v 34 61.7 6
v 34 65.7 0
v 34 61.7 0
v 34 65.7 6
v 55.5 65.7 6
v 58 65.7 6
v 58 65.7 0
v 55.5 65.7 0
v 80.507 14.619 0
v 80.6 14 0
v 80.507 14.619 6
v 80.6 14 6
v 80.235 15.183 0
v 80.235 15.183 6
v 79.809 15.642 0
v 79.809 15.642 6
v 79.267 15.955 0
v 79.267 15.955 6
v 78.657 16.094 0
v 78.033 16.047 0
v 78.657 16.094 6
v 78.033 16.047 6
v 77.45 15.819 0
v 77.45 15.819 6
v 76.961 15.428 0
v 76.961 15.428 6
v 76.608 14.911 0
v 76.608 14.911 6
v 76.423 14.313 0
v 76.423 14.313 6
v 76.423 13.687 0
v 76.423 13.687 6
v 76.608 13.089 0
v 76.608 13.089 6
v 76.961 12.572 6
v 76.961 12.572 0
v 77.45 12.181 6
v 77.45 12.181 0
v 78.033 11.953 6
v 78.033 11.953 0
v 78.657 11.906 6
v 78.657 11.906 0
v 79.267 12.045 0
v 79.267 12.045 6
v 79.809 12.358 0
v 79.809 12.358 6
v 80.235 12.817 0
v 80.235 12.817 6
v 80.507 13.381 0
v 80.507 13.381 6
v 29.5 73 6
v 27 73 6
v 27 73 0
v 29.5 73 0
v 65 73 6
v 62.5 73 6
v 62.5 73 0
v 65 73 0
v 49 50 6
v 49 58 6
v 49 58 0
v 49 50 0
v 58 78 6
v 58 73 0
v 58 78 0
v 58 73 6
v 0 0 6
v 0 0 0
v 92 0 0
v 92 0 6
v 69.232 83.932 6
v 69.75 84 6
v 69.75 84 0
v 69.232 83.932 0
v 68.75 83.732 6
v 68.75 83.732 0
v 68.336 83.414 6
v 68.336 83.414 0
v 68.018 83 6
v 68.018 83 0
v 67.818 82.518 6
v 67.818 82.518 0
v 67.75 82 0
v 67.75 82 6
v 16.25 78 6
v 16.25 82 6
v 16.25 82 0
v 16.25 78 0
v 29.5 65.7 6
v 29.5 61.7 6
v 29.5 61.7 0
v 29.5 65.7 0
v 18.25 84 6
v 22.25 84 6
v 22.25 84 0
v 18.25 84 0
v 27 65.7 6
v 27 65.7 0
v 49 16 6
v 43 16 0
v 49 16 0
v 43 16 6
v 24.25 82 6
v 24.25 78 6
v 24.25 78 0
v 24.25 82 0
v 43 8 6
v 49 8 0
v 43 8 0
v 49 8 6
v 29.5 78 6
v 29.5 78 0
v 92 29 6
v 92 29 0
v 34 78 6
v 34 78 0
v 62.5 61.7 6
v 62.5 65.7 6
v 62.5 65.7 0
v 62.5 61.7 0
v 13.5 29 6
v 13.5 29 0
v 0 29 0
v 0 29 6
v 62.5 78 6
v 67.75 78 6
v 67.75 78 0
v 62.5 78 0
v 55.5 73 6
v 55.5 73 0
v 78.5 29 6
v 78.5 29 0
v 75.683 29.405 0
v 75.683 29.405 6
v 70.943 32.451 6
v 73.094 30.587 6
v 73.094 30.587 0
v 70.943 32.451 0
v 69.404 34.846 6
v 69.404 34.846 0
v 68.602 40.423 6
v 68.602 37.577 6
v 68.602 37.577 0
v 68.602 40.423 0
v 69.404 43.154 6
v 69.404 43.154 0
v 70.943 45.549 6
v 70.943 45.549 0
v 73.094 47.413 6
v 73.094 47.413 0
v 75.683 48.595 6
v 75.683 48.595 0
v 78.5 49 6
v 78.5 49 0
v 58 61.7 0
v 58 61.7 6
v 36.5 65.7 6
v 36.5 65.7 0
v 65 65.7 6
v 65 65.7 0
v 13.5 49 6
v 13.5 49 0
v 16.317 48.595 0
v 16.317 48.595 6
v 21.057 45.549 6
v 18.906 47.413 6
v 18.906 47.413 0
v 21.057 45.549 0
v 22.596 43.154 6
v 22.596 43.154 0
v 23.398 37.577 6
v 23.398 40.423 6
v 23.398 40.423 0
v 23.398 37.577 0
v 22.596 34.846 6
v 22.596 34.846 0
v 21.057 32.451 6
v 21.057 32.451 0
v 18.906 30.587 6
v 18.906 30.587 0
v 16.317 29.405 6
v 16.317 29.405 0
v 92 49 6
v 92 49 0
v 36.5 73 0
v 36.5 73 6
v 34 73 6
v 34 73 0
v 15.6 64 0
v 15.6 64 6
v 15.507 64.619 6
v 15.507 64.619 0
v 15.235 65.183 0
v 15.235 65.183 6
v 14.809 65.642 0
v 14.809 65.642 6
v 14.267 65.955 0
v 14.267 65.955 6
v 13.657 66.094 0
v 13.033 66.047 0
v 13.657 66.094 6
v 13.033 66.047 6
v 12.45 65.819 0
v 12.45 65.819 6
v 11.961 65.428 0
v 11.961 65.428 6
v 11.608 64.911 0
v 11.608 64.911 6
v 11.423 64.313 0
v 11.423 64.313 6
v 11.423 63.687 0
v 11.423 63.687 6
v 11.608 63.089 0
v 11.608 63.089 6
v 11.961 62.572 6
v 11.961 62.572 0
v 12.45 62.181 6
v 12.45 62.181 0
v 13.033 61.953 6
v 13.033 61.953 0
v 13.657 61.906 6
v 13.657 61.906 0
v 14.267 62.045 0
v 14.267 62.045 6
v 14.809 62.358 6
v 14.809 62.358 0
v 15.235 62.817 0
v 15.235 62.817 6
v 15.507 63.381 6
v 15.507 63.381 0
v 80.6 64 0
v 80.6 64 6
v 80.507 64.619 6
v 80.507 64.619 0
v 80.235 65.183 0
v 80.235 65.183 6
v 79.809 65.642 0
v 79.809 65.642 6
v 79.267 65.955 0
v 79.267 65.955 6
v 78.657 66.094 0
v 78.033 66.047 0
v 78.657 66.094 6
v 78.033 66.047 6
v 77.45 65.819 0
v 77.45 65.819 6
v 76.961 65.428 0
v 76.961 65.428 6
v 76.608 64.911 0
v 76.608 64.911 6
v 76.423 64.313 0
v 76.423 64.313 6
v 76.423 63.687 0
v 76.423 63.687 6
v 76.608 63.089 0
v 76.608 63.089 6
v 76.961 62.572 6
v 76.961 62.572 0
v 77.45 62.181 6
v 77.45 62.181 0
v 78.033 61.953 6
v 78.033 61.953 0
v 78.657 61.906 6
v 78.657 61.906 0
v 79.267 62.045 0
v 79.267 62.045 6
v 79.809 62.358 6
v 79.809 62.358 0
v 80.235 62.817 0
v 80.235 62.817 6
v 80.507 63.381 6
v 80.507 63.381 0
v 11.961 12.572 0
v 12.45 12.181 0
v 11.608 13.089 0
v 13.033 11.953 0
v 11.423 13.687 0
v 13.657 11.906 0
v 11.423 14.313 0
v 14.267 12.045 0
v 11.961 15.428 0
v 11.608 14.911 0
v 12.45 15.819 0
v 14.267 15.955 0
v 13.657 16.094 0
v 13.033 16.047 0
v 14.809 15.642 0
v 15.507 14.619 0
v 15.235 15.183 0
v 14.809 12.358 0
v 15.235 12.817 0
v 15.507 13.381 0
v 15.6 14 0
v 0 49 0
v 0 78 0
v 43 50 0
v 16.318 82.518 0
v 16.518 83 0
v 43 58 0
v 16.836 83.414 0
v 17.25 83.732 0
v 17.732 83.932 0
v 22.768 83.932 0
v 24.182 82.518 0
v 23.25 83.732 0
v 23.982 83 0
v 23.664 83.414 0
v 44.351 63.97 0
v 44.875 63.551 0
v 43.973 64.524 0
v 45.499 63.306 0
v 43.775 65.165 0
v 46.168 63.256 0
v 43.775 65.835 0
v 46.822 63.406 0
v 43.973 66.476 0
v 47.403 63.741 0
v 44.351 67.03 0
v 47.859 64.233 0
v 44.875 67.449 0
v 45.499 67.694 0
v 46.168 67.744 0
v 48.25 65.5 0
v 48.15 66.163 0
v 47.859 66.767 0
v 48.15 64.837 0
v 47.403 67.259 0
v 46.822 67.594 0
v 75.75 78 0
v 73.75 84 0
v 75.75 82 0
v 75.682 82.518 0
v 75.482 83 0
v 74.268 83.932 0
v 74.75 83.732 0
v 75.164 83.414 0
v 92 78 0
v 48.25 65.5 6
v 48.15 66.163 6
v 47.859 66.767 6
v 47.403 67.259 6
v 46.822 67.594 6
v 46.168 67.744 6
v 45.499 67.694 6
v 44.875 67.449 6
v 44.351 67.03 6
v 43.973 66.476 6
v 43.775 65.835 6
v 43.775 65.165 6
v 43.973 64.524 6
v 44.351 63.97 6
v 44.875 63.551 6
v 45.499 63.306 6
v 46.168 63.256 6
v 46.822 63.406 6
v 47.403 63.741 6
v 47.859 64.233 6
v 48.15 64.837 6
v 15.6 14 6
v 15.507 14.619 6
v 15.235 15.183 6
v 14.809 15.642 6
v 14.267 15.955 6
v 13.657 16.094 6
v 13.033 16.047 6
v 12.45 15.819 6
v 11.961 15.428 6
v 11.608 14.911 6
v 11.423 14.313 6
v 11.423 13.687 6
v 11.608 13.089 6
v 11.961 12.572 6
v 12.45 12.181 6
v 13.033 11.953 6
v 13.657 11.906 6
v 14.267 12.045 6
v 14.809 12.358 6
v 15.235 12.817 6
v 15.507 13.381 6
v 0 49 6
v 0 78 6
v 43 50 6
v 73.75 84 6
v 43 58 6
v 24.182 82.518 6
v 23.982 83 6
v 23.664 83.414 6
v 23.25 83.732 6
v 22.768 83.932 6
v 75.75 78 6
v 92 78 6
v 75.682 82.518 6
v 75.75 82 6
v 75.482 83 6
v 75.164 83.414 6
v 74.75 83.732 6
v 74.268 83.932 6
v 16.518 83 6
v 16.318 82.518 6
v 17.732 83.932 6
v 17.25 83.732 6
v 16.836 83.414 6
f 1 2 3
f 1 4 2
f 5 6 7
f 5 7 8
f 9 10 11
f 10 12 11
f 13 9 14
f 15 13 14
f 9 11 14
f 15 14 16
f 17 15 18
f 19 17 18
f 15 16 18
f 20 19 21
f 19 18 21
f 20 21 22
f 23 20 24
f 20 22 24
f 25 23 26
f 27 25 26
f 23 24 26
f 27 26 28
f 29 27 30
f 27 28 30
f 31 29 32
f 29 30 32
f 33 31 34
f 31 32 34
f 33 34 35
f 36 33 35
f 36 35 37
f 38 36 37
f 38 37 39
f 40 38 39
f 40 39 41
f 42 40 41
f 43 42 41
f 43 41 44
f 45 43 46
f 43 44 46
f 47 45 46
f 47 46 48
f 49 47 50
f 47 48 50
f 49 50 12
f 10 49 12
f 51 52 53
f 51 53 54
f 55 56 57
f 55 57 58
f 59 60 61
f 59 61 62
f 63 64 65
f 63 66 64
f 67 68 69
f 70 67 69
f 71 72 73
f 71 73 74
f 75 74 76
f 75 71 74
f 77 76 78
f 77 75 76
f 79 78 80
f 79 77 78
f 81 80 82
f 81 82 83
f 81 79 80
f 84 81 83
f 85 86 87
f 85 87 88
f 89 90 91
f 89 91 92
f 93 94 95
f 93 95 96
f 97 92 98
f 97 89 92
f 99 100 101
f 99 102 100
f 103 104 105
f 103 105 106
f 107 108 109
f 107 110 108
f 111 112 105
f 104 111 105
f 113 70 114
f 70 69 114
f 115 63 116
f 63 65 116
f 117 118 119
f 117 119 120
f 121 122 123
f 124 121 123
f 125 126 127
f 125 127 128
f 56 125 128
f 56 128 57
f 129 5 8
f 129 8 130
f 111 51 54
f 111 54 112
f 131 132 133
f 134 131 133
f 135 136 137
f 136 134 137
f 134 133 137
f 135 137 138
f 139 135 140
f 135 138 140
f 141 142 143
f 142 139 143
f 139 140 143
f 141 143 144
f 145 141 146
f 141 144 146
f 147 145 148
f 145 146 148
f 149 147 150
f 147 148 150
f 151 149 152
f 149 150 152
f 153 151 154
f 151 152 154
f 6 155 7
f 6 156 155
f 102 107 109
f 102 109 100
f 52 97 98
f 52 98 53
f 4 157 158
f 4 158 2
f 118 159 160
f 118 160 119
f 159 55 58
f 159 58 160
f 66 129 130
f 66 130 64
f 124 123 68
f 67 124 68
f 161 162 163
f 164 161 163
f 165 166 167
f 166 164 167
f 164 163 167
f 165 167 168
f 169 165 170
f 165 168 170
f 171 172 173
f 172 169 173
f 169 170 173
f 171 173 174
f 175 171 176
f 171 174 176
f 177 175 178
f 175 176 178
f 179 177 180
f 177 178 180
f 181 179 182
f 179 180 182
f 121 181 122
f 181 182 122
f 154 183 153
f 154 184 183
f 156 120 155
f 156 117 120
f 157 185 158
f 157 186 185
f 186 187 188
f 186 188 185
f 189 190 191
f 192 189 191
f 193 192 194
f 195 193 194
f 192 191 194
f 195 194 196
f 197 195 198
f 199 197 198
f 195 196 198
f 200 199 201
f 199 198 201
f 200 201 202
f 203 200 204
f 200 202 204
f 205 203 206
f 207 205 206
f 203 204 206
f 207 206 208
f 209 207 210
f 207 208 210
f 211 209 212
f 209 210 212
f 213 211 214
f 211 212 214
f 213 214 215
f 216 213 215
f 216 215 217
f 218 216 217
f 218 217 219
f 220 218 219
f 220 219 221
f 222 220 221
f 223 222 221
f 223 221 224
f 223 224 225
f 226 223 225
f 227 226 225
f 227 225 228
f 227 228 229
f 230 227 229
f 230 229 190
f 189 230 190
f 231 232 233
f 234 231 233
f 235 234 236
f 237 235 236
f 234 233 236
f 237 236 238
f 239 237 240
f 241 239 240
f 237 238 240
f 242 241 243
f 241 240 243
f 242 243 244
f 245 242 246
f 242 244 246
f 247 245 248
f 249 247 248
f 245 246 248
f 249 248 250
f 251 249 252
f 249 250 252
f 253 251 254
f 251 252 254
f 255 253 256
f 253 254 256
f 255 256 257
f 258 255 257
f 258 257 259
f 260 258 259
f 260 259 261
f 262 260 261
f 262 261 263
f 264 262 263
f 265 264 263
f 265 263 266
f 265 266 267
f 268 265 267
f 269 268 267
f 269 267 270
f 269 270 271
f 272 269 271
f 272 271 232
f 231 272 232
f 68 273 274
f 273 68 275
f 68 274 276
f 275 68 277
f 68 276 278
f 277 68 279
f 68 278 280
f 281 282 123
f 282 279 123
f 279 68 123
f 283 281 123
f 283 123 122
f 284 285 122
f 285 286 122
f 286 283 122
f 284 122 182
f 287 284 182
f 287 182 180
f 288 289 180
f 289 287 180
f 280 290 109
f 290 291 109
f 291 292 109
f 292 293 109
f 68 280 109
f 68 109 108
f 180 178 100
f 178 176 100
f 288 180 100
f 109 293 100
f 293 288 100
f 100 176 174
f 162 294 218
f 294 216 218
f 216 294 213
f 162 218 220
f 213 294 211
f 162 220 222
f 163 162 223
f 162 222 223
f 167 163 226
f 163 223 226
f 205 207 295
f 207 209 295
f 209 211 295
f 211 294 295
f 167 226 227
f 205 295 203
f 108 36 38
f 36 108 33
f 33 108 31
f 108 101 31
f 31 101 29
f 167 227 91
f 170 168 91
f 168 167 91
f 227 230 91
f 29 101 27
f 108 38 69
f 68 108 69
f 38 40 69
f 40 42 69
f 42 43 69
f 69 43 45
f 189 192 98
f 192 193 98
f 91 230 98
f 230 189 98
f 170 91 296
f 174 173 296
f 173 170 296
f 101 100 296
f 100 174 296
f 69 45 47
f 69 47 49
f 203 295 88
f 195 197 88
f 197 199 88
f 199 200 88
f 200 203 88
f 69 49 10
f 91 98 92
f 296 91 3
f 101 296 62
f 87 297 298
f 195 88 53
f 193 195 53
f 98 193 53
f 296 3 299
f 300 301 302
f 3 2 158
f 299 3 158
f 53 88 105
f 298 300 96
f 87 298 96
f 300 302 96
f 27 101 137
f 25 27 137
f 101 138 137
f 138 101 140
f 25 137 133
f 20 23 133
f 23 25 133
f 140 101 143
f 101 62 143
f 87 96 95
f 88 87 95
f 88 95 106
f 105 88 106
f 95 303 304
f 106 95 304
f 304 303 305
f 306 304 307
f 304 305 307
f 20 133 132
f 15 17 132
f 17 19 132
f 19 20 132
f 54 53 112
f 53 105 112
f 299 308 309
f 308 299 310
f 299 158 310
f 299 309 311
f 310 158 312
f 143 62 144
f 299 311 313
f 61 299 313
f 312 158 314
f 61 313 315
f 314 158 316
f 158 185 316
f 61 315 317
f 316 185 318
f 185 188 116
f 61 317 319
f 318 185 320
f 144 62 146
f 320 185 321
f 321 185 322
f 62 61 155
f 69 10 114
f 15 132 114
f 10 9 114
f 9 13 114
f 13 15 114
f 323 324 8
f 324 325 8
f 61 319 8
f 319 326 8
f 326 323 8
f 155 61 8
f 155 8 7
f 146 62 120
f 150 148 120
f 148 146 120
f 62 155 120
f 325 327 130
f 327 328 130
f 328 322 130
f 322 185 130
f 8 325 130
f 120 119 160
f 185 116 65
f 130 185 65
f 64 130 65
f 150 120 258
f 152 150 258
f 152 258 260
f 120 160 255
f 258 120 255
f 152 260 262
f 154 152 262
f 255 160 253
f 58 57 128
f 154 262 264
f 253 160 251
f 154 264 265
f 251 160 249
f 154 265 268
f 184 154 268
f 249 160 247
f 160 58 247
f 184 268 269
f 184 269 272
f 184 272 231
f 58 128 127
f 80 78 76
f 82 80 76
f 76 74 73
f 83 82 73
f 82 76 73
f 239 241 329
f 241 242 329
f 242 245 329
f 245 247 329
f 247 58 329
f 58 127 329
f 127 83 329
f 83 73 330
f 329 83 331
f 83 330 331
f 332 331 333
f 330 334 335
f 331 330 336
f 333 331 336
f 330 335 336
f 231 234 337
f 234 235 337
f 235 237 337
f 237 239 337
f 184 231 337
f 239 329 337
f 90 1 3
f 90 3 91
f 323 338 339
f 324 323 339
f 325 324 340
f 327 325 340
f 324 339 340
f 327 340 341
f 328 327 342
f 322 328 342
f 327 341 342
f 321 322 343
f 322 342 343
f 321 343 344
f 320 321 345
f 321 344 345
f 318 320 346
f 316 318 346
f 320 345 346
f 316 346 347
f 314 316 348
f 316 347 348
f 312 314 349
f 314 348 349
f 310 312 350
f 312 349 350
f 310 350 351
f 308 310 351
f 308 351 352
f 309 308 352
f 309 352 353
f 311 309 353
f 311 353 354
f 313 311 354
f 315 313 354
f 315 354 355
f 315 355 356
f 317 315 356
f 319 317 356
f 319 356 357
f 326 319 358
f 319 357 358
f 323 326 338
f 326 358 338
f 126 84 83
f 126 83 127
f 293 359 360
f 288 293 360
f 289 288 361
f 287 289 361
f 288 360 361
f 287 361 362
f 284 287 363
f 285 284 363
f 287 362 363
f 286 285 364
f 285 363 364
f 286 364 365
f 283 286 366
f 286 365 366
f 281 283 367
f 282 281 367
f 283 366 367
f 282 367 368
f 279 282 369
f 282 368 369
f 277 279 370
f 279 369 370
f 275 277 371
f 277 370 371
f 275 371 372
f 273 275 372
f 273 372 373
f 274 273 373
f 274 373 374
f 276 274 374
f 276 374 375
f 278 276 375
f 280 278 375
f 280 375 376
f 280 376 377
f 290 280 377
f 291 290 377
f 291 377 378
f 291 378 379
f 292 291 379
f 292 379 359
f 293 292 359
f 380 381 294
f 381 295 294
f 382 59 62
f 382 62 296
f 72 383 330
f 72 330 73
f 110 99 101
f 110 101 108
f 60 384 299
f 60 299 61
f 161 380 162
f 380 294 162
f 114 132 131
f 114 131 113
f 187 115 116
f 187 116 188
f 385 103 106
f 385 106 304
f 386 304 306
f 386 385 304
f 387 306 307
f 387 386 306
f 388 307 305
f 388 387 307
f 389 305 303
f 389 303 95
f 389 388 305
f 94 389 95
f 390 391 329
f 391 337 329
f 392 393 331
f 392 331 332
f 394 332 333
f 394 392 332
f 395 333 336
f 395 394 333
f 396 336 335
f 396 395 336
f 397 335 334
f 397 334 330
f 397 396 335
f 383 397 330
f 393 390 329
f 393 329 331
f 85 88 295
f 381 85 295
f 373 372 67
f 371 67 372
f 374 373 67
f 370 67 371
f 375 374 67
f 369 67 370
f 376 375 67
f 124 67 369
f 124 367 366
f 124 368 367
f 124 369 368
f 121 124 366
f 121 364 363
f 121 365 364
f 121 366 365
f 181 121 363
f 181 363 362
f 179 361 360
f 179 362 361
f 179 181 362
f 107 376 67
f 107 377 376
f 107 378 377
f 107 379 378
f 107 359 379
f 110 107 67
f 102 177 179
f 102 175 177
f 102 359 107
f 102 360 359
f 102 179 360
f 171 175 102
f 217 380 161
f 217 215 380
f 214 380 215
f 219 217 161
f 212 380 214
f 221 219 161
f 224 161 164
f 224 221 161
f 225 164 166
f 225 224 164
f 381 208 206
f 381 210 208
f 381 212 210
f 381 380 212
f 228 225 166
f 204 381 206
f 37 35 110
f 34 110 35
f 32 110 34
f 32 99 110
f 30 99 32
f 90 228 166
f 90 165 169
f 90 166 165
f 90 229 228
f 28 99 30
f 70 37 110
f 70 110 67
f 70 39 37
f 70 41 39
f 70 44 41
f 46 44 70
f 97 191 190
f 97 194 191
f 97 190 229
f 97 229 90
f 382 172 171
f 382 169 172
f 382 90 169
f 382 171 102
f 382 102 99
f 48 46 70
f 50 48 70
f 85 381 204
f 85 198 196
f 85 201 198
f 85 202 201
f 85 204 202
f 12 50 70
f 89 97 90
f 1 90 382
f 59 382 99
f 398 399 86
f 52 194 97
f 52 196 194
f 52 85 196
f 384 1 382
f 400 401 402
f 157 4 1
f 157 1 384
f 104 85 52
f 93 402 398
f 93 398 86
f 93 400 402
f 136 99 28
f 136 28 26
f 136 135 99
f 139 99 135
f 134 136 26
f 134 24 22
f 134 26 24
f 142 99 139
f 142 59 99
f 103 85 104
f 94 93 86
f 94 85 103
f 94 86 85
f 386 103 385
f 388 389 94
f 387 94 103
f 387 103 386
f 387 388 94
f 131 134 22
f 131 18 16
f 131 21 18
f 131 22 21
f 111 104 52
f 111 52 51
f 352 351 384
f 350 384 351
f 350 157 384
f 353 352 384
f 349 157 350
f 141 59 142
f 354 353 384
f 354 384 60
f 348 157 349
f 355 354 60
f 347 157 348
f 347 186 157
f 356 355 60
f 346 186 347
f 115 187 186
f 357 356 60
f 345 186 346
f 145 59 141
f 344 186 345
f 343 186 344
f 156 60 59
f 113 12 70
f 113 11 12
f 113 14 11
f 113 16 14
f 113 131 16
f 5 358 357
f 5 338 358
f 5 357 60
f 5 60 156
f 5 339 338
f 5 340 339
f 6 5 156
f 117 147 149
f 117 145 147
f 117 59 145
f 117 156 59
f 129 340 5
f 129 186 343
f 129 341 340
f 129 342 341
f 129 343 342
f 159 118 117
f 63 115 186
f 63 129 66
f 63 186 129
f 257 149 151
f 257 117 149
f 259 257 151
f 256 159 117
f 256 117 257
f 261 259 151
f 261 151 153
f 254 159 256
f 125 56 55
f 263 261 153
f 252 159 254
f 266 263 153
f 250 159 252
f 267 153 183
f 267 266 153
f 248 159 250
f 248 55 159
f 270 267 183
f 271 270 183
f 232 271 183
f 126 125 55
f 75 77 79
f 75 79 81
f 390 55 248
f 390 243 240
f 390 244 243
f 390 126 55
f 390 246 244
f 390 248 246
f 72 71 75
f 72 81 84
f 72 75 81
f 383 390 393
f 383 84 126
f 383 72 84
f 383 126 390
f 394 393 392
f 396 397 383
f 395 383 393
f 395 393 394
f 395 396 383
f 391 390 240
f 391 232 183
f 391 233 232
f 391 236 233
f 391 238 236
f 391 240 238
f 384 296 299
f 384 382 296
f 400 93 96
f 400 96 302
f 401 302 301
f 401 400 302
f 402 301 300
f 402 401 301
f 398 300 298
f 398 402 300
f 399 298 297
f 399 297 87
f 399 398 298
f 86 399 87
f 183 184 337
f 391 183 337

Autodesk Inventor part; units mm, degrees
ref_plane "YZ Plane" through (0, 0, 0) normal (1, 0, 0) x (0, 1, 0)
ref_plane "XZ Plane" through (0, 0, 0) normal (0, 1, 0) x (-1, 0, 0)
ref_plane "XY Plane" through (0, 0, 0) normal (0, 0, 1) x (1, 0, 0)
sketch "Sketch1" plane through (0, 0, 0) normal (0, 0, 1) x (1, 0, 0)
  line L0 (0, 0) -> (92, 0)
  line L1 (92, 78) -> (0, 78)
  line L2 (0, 49) -> (13.5, 49)
  arc A0 (13.5, 29) -> (13.5, 49) centre (13.5, 39) ccw
  line L3 (13.5, 29) -> (0, 29)
  line L4 (92, 49) -> (78.5, 49)
  arc A1 (78.5, 49) -> (78.5, 29) centre (78.5, 39) ccw
  line L5 (78.5, 29) -> (92, 29)
  line L6 (0, 78) -> (0, 49)
  line L7 (0, 29) -> (0, 0)
  line L8 (92, 0) -> (92, 29)
  line L9 (92, 49) -> (92, 78)
  dimension "d0" = 92
  dimension "d1" = 20
  dimension "d2" = 78
  dimension "d3" = 39
  dimension "d11" = 65
extrude "Extrusion1" add sketch "Sketch1" along normal blind 6
sketch "Sketch2" plane through (0, 0, 6) normal (0, 0, 1) x (1, 0, 0)
  arc A0 (78.5, 49) -> (78.5, 29) centre (78.5, 39) ccw projected
  arc A1 (13.5, 29) -> (13.5, 49) centre (13.5, 39) ccw projected
  line L0 (13.5, 64) -> (78.5, 64) construction
  line L1 (78.5, 64) -> (78.5, 14) construction
  line L2 (78.5, 14) -> (13.5, 14) construction
  line L3 (13.5, 14) -> (13.5, 64) construction
  circle A2 centre (13.5, 64) radius 2.1
  circle A3 centre (13.5, 14) radius 2.1
  circle A4 centre (78.5, 14) radius 2.1
  circle A5 centre (78.5, 64) radius 2.1
  dimension "d7" = 4.2
  dimension "d8" = 50
extrude "Extrusion2" cut sketch "Sketch2" against normal blind 6
sketch "Sketch3" plane through (0, 0, 6) normal (0, 0, 1) x (1, 0, 0)
  line L0 (92, 78) -> (0, 78) projected
  line L1 (29.5, 78) -> (34, 78)
  line L2 (34, 61.7) -> (29.5, 61.7)
  line L3 (36.5, 73) -> (36.5, 65.7)
  line L4 (27, 65.7) -> (27, 73)
  line L5 (34, 78) -> (34, 73)
  line L6 (34, 65.7) -> (34, 61.7)
  line L7 (29.5, 61.7) -> (29.5, 65.7)
  line L8 (29.5, 73) -> (29.5, 78)
  line L9 (27, 73) -> (29.5, 73)
  line L10 (34, 73) -> (36.5, 73)
  line L11 (36.5, 65.7) -> (34, 65.7)
  line L12 (29.5, 65.7) -> (27, 65.7)
  line L13 (58, 78) -> (62.5, 78)
  line L14 (62.5, 61.7) -> (58, 61.7)
  line L15 (65, 73) -> (65, 65.7)
  line L16 (55.5, 65.7) -> (55.5, 73)
  line L17 (62.5, 78) -> (62.5, 73)
  line L18 (62.5, 65.7) -> (62.5, 61.7)
  line L19 (58, 61.7) -> (58, 65.7)
  line L20 (58, 73) -> (58, 78)
  line L21 (55.5, 73) -> (58, 73)
  line L22 (62.5, 73) -> (65, 73)
  line L23 (65, 65.7) -> (62.5, 65.7)
  line L24 (58, 65.7) -> (55.5, 65.7)
  line L25 (36.5, 69.35) -> (55.5, 69.35) construction
  point P0 (31.75, 61.7)
  point P1 (60.25, 61.7)
  point P2 (46, 69.35)
  point P3 (46, 78)
  dimension "d12" = 7.3
  dimension "d13" = 4
  dimension "d14" = 5
  dimension "d15" = 2.5
  dimension "d16" = 4.5
  dimension "d17" = 7.3
  dimension "d18" = 4
  dimension "d19" = 5
  dimension "d20" = 2.5
  dimension "d21" = 4.5
  dimension "d22" = 38
extrude "Extrusion3" cut sketch "Sketch3" against normal blind 6
sketch "Sketch4" plane through (0, 0, 6) normal (0, 0, 1) x (1, 0, 0)
  line L0 (29.5, 78) -> (0, 78) projected
  line L1 (92, 78) -> (62.5, 78) projected
  line L2 (62.5, 61.7) -> (58, 61.7) projected
  line L3 (34, 61.7) -> (29.5, 61.7) projected
  line L4 (16.25, 78) -> (24.25, 78)
  line L5 (24.25, 78) -> (24.25, 82)
  line L6 (22.25, 84) -> (18.25, 84)
  line L7 (16.25, 82) -> (16.25, 78)
  line L8 (67.75, 78) -> (75.75, 78)
  line L9 (75.75, 78) -> (75.75, 82)
  line L10 (73.75, 84) -> (69.75, 84)
  line L11 (67.75, 82) -> (67.75, 78)
  arc A0 (18.25, 84) -> (16.25, 82) centre (18.25, 82) ccw
  arc A1 (24.25, 82) -> (22.25, 84) centre (22.25, 82) ccw
  arc A2 (69.75, 84) -> (67.75, 82) centre (69.75, 82) ccw
  arc A3 (75.75, 82) -> (73.75, 84) centre (73.75, 82) ccw
  point P0 (31.75, 61.7)
  point P1 (60.25, 61.7)
  dimension "d25" = 2
  dimension "d26" = 8
  dimension "d27" = 8
  dimension "d28" = 7.5
  dimension "d29" = 7.5
  dimension "d30" = 6
extrude "Extrusion4" add sketch "Sketch4" against normal blind 6
sketch "Sketch5" plane through (0, 0, 6) normal (0, 0, 1) x (1, 0, 0)
  line L0 (0, 0) -> (92, 0) projected
  line L1 (58, 78) -> (34, 78) projected
  line L2 (43, 58) -> (49, 58)
  line L3 (49, 58) -> (49, 50)
  line L4 (49, 50) -> (43, 50)
  line L5 (43, 50) -> (43, 58)
  line L6 (43, 16) -> (49, 16)
  line L7 (49, 16) -> (49, 8)
  line L8 (49, 8) -> (43, 8)
  line L9 (43, 8) -> (43, 16)
  point P0 (46, 0)
  point P1 (46, 8)
  dimension "d33" = 6
  dimension "d34" = 8
  dimension "d35" = 20
  dimension "d36" = 8
extrude "Extrusion5" cut sketch "Sketch5" against normal blind 6
sketch "Sketch6" plane through (0, 0, 6) normal (0, 0, 1) x (1, 0, 0)
  line L0 (43, 58) -> (49, 58) projected
  line L1 (58, 78) -> (34, 78) projected
  circle A0 centre (46, 65.5) radius 2.25
  point P0 (46, 58)
  dimension "d39" = 4.5
  dimension "d40" = 12.5
extrude "Extrusion6" cut sketch "Sketch6" against normal through all
equation "\"d3\" = 0.5 * d2"
properties part number "x_carryage_extruder_mount"
